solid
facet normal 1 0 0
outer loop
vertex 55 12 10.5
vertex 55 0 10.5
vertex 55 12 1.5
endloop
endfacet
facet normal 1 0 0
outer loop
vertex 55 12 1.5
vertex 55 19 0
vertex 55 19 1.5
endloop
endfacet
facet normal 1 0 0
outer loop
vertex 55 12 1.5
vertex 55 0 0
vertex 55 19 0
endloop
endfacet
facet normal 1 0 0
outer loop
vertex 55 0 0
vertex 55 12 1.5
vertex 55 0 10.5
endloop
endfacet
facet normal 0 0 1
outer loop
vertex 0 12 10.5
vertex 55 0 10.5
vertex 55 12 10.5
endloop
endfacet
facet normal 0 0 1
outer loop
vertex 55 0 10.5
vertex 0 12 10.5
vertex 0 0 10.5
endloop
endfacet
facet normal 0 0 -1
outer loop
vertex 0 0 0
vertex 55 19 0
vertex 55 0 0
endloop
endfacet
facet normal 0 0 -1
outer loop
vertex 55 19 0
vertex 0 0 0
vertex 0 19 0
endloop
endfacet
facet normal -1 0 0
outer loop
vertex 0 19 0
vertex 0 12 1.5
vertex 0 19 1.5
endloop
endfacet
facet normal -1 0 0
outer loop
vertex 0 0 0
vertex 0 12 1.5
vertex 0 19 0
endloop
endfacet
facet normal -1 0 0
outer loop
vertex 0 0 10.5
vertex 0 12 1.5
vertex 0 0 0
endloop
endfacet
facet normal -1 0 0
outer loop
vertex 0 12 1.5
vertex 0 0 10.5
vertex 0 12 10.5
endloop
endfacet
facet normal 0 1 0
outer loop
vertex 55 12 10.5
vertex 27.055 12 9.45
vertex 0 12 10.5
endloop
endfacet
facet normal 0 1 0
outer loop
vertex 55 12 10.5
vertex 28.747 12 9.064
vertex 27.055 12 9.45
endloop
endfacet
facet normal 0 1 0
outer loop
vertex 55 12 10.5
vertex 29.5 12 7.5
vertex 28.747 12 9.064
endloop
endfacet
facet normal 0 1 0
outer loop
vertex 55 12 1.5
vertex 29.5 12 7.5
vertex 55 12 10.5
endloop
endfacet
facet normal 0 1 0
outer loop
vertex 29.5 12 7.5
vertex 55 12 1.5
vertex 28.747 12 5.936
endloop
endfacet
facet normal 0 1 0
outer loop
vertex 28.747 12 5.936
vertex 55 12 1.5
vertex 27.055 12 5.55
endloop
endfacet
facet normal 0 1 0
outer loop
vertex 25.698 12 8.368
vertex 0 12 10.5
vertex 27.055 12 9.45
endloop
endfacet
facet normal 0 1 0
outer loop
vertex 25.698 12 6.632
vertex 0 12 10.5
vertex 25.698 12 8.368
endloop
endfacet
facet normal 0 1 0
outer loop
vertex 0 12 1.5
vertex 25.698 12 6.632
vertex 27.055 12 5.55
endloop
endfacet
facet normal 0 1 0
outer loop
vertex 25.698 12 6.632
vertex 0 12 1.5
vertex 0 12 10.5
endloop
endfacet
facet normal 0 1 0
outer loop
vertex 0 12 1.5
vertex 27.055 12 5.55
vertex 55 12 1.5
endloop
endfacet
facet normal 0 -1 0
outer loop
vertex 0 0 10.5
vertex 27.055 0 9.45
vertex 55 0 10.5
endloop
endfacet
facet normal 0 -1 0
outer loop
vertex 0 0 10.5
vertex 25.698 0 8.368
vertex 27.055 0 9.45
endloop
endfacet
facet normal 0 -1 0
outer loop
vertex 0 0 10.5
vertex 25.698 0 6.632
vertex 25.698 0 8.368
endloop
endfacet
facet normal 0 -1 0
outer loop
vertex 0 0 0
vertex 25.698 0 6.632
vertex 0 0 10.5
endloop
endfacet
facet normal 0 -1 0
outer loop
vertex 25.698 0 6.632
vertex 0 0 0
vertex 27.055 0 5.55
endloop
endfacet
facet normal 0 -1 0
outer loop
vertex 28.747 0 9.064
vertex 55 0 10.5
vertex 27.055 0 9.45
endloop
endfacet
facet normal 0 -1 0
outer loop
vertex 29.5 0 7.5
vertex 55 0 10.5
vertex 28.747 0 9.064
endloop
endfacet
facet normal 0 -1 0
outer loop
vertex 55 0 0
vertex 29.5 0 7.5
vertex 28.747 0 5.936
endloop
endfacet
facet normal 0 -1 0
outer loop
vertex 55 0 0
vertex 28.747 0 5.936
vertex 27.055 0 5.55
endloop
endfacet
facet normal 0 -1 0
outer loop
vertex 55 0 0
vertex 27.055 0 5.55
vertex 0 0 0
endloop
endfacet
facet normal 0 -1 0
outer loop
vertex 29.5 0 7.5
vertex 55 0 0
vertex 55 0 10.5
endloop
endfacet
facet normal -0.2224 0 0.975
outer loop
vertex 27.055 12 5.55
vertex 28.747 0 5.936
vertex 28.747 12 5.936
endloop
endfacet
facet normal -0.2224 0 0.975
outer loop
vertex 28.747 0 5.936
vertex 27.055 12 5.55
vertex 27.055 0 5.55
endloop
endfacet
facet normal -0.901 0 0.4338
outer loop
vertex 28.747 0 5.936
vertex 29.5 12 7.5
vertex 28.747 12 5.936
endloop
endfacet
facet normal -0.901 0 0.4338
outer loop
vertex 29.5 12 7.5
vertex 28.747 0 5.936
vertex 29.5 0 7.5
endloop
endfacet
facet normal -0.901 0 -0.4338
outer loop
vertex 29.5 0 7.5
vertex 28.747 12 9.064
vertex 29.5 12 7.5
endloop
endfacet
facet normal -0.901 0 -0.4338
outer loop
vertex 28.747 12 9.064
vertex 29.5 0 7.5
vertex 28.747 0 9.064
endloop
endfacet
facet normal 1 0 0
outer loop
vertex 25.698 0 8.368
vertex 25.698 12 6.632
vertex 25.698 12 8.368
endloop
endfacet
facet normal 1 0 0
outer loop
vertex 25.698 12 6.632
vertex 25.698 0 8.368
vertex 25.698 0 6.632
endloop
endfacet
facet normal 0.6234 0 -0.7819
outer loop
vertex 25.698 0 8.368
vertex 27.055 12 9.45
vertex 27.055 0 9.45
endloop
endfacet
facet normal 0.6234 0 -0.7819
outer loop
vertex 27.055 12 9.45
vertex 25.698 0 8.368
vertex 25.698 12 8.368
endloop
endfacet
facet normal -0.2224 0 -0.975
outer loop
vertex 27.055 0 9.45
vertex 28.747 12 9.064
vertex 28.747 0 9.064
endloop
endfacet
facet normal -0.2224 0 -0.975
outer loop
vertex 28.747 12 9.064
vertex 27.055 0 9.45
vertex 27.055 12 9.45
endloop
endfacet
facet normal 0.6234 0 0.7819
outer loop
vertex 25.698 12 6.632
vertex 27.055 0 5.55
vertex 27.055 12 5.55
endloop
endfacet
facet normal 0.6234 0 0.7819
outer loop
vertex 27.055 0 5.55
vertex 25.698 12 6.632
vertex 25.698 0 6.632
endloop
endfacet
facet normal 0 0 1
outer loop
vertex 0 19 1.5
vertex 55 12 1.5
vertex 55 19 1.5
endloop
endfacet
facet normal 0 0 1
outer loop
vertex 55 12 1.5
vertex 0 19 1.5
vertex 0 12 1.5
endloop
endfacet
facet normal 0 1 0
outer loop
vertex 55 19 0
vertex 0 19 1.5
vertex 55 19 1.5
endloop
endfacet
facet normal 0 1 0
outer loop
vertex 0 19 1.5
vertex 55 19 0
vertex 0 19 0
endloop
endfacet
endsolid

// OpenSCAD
//All measurements are in millimeters(mm)

//Wider on one side than another? Leave as no for a regular box shaped shim
type = "no";

//How much gap between wall and outlet box? Left side - When type=no is both left and right thickness
L_thickness = 12;	

//Right side - Unused when type=no
R_thickness = 9;	

//Width of outlet box
Box_width = 55;

//Height you want the shim as measured from the edge of the junction box
Box_height = 10.5;

//Thickness of lip that inserts under the junction box, a "0" removes the lip
Lip_thick = 1.5;

//Length of Lip
Lip_length = 7;

//Size of hole radius
Radius = 2;

//Distance from edge of outlet box to the center of the screw hole
Hole_distance = 7.5;



if(type == "no")
{
translate([0,L_thickness,0])cube([Box_width,Lip_length,Lip_thick]);
difference(){
	cube([Box_width,L_thickness,Box_height]);
	translate([Box_width/2,-.00001,Hole_distance])	
	rotate([270,0,0])	
	cylinder(L_thickness+.00002,Radius,Radius);
	
}}
if(type == "yes")
{
cube([Box_width,Lip_length,Lip_thick]);
difference(){
polyhedron(
  points=[ [0,0,0],[0,-L_thickness,0],[0,-L_thickness,Box_height],[0,0,Box_height],																					//left side box
	[Box_width,0,0],[Box_width,0,Box_height],[Box_width,-R_thickness,Box_height],[Box_width,-R_thickness,0]],                          // right side box
  faces=[ [0,1,2],[0,2,3],												//left face
				[0,3,4],[3,5,4],              						//front face
          [3,2,5],[2,6,5],												//top face
				[2,1,6],[1,7,6],												//back face
				[0,4,1],[1,4,7],												//bottom face
				[4,5,6],[4,6,7] ]                         		//right face
 );
	translate([Box_width/2,(-(L_thickness+R_thickness)/2)-3,Hole_distance])	
	rotate([270,0,0])	
	cylinder(L_thickness+3,Radius,Radius);
	
}}
